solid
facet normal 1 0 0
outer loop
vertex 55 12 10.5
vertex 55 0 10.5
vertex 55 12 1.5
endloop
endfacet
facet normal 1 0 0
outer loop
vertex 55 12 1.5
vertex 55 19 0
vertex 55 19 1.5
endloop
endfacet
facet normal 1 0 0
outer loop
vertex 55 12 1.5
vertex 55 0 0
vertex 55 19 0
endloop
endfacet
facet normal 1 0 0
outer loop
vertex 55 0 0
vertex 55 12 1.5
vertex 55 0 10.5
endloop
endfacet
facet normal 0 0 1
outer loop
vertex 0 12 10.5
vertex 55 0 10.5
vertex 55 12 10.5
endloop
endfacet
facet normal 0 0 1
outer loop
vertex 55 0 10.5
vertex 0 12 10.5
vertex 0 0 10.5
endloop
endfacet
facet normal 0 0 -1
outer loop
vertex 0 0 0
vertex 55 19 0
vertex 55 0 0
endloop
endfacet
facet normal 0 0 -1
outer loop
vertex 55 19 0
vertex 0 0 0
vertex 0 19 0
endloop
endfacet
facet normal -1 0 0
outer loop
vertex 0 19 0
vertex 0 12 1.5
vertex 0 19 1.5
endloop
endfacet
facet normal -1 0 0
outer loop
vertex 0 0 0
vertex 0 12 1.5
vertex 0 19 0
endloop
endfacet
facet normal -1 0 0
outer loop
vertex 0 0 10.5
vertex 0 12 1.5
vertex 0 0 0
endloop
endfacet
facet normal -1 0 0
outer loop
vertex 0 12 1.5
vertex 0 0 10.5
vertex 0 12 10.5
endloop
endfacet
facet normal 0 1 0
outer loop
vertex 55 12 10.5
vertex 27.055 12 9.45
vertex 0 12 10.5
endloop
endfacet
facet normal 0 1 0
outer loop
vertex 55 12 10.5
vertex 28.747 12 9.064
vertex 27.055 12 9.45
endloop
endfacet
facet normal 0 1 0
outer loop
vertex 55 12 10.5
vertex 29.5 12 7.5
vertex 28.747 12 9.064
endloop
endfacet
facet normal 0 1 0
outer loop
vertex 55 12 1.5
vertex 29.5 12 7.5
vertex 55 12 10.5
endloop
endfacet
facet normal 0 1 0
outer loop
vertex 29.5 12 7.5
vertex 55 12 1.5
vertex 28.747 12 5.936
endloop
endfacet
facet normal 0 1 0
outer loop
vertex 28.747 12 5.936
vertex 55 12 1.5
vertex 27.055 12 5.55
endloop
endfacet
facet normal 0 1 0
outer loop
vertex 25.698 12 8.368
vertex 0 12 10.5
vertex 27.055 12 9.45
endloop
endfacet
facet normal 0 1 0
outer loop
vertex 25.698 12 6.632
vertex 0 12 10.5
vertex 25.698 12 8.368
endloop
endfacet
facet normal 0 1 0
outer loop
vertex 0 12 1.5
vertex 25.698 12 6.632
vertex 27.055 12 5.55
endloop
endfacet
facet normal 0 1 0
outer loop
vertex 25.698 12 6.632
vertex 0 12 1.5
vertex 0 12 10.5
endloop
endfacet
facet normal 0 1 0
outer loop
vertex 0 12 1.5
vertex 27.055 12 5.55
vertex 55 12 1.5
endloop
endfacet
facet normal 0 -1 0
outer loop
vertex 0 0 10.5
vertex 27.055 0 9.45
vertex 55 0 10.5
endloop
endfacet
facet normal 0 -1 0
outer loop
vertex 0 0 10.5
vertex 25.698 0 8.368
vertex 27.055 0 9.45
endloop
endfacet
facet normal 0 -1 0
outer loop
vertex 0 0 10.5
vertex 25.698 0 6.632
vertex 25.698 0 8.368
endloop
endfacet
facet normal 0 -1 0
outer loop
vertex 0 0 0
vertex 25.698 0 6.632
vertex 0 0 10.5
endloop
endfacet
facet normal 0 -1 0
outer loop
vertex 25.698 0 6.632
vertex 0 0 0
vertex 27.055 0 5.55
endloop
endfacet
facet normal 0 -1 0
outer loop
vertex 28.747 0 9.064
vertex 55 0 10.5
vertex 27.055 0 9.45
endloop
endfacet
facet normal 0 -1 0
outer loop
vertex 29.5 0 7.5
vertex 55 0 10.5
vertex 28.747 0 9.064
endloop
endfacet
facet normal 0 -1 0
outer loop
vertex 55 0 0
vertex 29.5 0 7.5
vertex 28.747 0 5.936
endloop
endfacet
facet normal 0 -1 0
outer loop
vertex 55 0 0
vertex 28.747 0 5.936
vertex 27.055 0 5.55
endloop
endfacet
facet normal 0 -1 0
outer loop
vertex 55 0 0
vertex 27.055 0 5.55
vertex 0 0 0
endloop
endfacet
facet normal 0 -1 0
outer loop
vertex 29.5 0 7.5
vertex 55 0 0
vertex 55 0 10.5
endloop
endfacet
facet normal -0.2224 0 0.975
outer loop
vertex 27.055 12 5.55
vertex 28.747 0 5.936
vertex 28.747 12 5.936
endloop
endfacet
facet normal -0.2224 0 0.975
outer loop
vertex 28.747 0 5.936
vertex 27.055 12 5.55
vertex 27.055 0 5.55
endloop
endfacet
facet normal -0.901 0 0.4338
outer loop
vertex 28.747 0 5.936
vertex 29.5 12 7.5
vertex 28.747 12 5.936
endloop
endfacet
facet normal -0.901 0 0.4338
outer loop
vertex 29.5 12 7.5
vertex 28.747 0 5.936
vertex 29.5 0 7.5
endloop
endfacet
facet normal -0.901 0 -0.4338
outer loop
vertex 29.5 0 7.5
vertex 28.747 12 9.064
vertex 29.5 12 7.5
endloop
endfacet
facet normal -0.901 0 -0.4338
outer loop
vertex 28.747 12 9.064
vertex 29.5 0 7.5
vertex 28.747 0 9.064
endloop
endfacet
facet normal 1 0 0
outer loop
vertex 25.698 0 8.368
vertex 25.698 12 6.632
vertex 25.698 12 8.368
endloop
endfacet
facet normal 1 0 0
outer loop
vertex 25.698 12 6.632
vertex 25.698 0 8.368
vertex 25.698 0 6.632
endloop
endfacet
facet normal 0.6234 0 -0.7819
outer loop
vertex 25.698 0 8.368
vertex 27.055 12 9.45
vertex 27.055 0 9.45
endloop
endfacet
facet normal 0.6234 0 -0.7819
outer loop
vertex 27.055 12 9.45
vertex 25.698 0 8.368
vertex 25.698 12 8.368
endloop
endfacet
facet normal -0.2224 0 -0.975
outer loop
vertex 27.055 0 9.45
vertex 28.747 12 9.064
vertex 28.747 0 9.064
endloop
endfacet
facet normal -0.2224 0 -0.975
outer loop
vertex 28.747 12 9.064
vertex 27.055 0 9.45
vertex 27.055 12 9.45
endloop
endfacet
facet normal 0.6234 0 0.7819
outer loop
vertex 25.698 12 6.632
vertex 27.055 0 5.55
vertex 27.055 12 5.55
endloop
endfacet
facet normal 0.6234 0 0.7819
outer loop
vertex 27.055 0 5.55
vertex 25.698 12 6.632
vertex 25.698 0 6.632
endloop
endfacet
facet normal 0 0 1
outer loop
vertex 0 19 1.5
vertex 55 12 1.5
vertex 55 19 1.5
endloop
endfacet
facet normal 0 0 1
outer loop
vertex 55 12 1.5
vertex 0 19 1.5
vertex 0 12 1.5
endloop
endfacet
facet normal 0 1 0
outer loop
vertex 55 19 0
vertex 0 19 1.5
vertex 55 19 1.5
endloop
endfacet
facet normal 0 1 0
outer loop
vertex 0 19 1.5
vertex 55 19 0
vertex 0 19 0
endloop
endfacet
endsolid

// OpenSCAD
//All measurements are in millimeters(mm)

//Wider on one side than another? Leave as no for a regular box shaped shim
type = "no";

//How much gap between wall and outlet box? Left side - When type=no is both left and right thickness
L_thickness = 12;	

//Right side - Unused when type=no
R_thickness = 9;	

//Width of outlet box
Box_width = 55;

//Height you want the shim as measured from the edge of the junction box
Box_height = 10.5;

//Thickness of lip that inserts under the junction box, a "0" removes the lip
Lip_thick = 1.5;

//Length of Lip
Lip_length = 7;

//Size of hole radius
Radius = 2;

//Distance from edge of outlet box to the center of the screw hole
Hole_distance = 7.5;



if(type == "no")
{
translate([0,L_thickness,0])cube([Box_width,Lip_length,Lip_thick]);
difference(){
	cube([Box_width,L_thickness,Box_height]);
	translate([Box_width/2,-.00001,Hole_distance])	
	rotate([270,0,0])	
	cylinder(L_thickness+.00002,Radius,Radius);
	
}}
if(type == "yes")
{
cube([Box_width,Lip_length,Lip_thick]);
difference(){
polyhedron(
  points=[ [0,0,0],[0,-L_thickness,0],[0,-L_thickness,Box_height],[0,0,Box_height],																					//left side box
	[Box_width,0,0],[Box_width,0,Box_height],[Box_width,-R_thickness,Box_height],[Box_width,-R_thickness,0]],                          // right side box
  faces=[ [0,1,2],[0,2,3],												//left face
				[0,3,4],[3,5,4],              						//front face
          [3,2,5],[2,6,5],												//top face
				[2,1,6],[1,7,6],												//back face
				[0,4,1],[1,4,7],												//bottom face
				[4,5,6],[4,6,7] ]                         		//right face
 );
	translate([Box_width/2,(-(L_thickness+R_thickness)/2)-3,Hole_distance])	
	rotate([270,0,0])	
	cylinder(L_thickness+3,Radius,Radius);
	
}}
